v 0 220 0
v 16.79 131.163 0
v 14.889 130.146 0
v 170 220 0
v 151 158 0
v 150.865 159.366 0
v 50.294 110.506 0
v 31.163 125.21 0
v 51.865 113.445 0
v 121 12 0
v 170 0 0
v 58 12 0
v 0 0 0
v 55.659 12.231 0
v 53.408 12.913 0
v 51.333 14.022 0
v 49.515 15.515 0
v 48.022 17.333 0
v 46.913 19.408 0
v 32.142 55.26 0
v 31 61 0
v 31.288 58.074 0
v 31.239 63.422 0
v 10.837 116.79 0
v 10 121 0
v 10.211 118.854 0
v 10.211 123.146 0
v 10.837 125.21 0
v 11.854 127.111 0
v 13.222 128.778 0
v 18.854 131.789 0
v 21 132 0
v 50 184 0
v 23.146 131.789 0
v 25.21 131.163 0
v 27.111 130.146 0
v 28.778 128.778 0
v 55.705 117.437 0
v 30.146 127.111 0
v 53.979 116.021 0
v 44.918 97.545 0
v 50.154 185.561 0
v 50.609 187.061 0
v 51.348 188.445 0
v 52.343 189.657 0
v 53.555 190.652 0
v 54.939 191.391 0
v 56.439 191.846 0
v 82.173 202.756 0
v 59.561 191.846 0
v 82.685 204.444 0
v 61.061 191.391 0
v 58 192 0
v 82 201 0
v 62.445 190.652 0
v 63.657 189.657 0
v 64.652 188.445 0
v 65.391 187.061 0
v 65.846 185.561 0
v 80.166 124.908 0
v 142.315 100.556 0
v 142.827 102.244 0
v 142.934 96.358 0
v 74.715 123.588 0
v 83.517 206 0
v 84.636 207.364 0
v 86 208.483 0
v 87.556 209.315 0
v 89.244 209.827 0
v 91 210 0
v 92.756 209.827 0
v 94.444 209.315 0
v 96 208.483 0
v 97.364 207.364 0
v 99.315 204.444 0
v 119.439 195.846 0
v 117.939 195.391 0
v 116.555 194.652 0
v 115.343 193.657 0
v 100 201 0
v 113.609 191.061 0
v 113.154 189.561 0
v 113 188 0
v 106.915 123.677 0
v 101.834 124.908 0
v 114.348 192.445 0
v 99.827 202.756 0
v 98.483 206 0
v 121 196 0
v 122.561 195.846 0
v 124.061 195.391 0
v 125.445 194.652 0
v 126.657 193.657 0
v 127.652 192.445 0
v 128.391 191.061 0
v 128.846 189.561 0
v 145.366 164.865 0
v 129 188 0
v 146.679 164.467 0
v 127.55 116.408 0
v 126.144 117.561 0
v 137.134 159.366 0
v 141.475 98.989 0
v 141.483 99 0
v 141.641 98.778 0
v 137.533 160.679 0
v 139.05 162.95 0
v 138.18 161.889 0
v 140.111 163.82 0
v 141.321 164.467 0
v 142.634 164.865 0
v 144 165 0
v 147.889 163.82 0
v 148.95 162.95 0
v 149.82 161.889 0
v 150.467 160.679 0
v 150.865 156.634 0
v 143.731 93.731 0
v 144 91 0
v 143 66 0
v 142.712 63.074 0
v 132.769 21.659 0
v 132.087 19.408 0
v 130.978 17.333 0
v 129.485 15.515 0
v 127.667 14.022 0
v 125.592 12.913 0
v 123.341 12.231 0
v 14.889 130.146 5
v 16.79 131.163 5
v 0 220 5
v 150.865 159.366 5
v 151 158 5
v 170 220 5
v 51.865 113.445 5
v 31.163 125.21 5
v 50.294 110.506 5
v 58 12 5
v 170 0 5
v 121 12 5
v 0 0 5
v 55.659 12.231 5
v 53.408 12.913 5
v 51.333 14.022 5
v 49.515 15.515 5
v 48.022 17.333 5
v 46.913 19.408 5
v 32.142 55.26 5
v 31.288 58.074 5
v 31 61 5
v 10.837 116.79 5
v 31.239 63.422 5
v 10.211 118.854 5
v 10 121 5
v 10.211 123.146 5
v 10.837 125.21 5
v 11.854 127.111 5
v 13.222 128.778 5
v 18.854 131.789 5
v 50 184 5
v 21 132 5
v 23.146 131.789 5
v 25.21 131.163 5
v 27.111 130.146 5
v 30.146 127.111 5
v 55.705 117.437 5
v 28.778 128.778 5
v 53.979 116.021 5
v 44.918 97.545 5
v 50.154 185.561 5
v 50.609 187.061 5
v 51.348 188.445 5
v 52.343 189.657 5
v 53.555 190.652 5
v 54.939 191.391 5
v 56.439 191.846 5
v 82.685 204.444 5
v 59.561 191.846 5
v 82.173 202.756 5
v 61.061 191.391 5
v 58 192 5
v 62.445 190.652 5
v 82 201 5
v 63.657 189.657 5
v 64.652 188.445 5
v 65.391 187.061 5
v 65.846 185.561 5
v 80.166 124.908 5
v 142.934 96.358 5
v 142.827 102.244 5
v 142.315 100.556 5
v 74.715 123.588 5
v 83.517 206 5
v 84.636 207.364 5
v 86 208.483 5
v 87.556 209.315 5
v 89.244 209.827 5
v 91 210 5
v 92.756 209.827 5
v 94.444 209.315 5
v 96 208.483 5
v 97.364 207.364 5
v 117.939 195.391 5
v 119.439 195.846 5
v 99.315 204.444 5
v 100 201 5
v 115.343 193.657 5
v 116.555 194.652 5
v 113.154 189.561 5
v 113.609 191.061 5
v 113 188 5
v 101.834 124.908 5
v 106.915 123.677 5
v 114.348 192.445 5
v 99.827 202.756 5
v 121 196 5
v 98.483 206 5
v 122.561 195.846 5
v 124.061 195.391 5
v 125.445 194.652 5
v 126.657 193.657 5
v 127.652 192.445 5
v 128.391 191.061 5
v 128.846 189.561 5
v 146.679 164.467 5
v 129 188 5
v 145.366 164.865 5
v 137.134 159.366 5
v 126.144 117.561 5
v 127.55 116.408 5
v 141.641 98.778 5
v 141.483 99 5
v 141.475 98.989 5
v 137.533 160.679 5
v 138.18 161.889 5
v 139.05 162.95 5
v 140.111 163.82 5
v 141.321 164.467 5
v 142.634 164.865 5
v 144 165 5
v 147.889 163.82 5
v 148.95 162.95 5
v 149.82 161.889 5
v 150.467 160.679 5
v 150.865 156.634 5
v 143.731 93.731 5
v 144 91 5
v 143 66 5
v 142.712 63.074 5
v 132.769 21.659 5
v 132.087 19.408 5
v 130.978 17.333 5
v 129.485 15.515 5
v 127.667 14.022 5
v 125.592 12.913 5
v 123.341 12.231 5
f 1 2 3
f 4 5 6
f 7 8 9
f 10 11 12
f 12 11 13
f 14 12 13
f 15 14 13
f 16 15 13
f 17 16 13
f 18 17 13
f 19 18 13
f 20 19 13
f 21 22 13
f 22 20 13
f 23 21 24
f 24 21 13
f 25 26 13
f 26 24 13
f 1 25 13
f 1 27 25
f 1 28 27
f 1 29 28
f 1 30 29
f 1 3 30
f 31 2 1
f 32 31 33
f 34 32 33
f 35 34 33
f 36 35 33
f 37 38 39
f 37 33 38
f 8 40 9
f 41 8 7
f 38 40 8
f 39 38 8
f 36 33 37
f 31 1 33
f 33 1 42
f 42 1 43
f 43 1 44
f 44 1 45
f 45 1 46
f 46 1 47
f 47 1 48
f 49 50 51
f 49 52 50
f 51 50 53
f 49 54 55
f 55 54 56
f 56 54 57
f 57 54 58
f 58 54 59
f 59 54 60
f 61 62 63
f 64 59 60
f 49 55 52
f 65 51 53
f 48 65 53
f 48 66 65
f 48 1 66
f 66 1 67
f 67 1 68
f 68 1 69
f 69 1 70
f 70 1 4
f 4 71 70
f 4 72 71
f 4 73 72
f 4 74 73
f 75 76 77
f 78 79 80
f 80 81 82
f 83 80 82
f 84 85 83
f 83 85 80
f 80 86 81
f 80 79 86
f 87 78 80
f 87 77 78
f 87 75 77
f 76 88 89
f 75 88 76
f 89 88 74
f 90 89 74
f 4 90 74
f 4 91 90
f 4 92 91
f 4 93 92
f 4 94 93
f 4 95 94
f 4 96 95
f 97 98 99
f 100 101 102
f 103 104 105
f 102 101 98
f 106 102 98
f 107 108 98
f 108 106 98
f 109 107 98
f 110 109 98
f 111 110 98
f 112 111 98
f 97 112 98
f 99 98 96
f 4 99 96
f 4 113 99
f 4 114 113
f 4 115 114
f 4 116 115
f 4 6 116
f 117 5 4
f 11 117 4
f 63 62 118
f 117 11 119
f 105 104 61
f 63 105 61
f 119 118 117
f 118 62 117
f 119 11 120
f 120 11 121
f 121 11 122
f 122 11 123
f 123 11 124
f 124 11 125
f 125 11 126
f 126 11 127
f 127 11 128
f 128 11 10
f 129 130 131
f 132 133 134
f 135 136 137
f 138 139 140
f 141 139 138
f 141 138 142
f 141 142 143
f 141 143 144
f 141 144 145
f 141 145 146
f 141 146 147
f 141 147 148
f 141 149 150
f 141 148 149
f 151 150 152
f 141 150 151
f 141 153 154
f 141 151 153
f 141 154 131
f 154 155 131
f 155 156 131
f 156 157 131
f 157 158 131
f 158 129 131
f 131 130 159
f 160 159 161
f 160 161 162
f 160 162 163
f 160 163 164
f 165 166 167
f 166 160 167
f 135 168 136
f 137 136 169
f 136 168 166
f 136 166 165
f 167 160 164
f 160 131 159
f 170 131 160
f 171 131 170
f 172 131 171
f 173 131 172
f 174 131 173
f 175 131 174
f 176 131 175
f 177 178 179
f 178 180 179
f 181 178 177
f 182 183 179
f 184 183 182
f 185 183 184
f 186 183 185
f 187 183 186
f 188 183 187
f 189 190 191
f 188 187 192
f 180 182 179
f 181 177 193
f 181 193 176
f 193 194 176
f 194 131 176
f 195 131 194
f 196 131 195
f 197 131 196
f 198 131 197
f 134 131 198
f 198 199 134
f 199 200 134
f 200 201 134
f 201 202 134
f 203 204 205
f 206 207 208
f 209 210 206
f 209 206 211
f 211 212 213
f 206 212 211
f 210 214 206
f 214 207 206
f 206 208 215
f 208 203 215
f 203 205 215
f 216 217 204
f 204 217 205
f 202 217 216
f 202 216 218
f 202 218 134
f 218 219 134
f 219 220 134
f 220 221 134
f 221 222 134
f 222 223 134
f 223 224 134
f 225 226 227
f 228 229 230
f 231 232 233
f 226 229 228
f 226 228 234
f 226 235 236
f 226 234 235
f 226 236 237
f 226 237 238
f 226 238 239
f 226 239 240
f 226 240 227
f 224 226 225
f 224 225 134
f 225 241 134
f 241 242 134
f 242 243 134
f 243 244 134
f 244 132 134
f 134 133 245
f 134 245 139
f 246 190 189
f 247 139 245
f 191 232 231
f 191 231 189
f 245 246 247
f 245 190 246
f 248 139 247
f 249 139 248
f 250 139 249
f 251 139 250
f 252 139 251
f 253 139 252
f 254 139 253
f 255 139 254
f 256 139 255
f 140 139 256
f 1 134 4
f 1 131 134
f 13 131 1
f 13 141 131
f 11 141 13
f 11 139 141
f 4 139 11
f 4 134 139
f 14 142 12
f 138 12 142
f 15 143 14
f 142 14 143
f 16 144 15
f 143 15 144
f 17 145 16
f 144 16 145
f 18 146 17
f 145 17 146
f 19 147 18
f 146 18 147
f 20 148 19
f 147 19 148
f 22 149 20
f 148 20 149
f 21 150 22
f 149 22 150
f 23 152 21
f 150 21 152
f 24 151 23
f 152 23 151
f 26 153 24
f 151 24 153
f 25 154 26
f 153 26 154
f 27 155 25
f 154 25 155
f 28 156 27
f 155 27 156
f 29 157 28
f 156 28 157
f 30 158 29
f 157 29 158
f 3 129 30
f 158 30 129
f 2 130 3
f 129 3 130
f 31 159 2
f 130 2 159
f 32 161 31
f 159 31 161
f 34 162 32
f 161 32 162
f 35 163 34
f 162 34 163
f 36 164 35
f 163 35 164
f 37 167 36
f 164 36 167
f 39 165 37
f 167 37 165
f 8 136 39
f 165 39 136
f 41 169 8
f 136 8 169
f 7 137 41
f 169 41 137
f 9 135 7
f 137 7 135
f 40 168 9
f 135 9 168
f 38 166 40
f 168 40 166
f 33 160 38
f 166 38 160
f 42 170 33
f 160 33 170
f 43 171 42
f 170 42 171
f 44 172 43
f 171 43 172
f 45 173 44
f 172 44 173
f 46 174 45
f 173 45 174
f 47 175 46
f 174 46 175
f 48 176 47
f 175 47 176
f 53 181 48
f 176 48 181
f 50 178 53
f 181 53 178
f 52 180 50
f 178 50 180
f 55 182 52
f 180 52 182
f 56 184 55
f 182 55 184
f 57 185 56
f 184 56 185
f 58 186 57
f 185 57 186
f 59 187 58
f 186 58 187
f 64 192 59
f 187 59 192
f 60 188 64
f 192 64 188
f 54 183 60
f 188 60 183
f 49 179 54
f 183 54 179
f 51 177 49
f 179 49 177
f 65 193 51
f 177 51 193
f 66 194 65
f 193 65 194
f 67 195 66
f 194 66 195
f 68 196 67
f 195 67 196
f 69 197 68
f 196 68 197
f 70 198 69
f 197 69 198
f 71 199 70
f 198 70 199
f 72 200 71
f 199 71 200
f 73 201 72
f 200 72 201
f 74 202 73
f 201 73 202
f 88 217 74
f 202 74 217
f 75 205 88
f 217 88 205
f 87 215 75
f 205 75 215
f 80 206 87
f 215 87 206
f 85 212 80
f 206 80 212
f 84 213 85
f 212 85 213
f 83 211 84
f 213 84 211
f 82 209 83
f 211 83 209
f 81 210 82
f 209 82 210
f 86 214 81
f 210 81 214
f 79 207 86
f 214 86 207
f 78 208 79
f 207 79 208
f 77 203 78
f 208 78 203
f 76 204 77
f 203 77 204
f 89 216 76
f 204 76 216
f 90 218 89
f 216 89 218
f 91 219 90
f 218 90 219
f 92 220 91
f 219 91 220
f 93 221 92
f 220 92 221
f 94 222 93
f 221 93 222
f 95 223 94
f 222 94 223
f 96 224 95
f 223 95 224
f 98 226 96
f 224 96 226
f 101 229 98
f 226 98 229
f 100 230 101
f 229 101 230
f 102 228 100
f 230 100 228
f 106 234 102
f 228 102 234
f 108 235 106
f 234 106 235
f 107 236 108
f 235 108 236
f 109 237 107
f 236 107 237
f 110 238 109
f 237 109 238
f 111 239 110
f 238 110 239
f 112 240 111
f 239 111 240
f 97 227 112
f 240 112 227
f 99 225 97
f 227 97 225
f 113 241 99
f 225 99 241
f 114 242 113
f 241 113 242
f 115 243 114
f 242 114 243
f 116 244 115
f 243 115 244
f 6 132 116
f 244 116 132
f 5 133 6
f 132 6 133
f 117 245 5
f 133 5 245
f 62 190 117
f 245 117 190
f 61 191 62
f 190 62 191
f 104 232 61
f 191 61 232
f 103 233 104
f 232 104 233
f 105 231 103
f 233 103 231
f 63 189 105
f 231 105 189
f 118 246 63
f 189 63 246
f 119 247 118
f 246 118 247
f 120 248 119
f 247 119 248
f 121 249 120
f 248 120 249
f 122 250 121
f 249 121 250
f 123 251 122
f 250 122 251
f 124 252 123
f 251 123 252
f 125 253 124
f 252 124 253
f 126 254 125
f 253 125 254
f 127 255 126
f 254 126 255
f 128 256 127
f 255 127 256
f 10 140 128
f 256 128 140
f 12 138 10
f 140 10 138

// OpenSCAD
// Hand Spray Paint Stencil
// 170 x 220 x 5 mm
// Roughly life-size hand cutout, fingers up, thumb to the left.
// Palm is a hull of seven circles for a smooth rounded body.
// Each finger is a hull of a base circle and a tip circle for a
// natural taper. Thumb same construction, just angled outward.

// ===== Parameters =====
width     = 170;
height    = 220;
thickness = 5;
frame     = 6;

$fn = 32;

// ===== Main =====
linear_extrude(height = thickness)
    difference() {
        square([width, height]);
        translate([frame, frame])
            hand();
    }

// ===== Hand =====
// Palm plus five tapered fingers, all unioned into one connected shape.
// Finger bases overlap with the palm's top circles so the union merges
// cleanly without any thin bridges.
module hand() {
    union() {
        palm();
        // finger(base_x, base_y, base_r, tip_x, tip_y, tip_r)
        finger( 60, 108, 10,  52, 178,  8);   // index
        finger( 85, 112, 11,  85, 195,  9);   // middle (longest)
        finger(110, 108, 10, 115, 182,  8);   // ring
        finger(128,  98,  9, 138, 152,  7);   // pinky (shortest, angled out)
        finger( 40,  58, 14,  15, 115, 11);   // thumb (wider, angled up-left)
    }
}

// Palm: hull of seven circles. Two small at the wrist, two big at the
// sides for the broad middle, three at the top to give the fingers a
// platform to emerge from.
module palm() {
    hull() {
        translate([ 52,  18]) circle(r = 12);   // wrist left
        translate([115,  18]) circle(r = 12);   // wrist right
        translate([ 40,  55]) circle(r = 15);   // left side bulge (slimmed)
        translate([122,  60]) circle(r = 15);   // right side bulge (slimmed)
        translate([124,  85]) circle(r = 14);   // pinky-side metacarpal (smooths the knuckle)
        translate([ 60,  98]) circle(r = 17);   // top under index
        translate([ 85, 102]) circle(r = 19);   // top under middle
        translate([110,  98]) circle(r = 17);   // top under ring
    }
}

// Tapered finger via hull of two circles
module finger(bx, by, br, tx, ty, tr) {
    hull() {
        translate([bx, by]) circle(r = br);
        translate([tx, ty]) circle(r = tr);
    }
}
